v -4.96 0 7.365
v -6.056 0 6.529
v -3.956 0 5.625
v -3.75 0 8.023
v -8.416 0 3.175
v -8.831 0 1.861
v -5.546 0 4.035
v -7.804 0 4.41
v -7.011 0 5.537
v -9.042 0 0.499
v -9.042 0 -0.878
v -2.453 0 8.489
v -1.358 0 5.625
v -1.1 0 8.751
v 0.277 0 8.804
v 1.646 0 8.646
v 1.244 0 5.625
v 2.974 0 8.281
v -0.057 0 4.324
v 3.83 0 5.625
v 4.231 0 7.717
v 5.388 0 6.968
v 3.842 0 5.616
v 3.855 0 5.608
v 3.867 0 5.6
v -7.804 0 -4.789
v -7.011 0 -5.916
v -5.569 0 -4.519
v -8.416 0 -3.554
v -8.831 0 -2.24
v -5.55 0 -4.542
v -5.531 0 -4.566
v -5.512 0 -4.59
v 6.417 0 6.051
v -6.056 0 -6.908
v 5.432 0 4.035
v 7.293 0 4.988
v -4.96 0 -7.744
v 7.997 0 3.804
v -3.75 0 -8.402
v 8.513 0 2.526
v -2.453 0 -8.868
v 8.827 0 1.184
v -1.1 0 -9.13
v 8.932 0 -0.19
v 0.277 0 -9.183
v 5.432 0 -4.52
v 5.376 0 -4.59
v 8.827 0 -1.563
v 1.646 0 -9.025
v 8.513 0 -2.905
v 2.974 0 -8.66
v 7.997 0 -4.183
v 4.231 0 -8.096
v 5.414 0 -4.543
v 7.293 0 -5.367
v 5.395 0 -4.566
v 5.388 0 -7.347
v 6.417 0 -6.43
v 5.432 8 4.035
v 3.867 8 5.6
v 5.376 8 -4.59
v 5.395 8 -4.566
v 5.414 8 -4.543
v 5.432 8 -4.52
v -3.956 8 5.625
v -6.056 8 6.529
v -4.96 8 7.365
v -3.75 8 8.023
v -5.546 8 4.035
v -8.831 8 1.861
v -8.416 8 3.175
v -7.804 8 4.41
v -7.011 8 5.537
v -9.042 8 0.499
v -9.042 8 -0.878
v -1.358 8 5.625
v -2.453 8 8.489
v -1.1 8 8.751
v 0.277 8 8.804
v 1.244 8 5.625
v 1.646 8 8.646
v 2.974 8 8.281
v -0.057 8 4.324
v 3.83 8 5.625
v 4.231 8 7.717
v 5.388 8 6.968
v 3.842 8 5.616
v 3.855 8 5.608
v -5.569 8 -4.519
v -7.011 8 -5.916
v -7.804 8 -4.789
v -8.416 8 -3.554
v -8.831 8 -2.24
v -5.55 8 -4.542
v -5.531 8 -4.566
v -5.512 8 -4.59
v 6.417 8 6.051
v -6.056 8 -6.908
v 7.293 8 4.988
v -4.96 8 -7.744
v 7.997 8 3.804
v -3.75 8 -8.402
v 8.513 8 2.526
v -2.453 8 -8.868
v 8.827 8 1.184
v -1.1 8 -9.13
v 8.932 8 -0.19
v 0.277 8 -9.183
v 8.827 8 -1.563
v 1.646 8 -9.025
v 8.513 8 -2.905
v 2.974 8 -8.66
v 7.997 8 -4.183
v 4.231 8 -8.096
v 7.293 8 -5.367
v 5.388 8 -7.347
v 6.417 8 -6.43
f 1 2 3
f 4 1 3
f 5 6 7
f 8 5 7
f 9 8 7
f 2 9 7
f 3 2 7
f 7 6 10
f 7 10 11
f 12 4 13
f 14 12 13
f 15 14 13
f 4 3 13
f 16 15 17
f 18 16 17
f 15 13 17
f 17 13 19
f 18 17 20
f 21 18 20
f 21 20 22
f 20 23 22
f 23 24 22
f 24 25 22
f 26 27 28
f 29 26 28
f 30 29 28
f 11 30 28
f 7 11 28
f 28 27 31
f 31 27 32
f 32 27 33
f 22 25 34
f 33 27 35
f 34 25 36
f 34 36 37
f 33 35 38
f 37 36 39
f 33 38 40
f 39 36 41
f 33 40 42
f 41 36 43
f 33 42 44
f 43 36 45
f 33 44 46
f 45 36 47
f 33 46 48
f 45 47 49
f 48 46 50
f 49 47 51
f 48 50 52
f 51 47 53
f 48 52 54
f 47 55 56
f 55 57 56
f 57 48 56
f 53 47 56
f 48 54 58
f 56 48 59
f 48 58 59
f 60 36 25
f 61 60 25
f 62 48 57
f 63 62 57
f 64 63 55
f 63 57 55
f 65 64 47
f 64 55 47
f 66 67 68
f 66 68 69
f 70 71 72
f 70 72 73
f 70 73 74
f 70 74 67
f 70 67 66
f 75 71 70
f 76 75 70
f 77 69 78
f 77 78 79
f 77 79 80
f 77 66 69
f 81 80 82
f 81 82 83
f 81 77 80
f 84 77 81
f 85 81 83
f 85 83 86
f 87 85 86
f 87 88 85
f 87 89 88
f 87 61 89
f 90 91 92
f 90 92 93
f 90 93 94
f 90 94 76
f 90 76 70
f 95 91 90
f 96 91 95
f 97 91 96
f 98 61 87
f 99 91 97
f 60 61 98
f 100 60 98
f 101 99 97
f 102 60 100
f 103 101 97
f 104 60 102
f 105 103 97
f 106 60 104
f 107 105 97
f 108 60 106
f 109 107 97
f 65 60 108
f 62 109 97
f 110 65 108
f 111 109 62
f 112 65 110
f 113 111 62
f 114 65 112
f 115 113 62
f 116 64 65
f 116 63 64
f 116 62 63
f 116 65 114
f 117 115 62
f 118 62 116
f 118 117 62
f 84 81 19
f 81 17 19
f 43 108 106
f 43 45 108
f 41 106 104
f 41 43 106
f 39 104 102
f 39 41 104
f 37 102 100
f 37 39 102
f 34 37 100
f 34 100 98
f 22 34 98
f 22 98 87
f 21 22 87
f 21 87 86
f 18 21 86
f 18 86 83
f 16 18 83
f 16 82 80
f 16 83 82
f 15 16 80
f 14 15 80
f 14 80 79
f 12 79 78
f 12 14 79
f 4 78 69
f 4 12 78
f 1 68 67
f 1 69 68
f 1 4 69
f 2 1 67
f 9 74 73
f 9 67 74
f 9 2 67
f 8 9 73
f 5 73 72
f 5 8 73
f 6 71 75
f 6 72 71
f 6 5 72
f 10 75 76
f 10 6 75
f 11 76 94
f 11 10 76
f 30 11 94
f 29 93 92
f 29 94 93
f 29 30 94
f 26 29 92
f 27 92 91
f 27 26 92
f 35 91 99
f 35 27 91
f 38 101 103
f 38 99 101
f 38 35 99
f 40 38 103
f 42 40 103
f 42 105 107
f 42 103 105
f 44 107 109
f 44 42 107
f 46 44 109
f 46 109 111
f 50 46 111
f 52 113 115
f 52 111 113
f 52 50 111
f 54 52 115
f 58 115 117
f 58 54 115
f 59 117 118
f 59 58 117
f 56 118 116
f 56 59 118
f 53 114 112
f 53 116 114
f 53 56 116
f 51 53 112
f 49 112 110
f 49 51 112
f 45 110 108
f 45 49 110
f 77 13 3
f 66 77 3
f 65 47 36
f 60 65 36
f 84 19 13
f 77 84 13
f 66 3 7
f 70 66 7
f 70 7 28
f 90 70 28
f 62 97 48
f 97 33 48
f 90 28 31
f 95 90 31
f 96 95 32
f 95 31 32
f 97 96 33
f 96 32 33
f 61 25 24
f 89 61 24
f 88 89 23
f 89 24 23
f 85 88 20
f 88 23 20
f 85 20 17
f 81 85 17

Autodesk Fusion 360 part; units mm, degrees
sketch "Sketch1" plane through (0, 0, 0) normal (0, 1, 0) x (1, 0, 0)
  circle A0 centre (0, 0) radius 6.5
  line L0 (10.0631, -5.0894) -> (15.2631, -5.0894)
  line L1 (15.2631, -5.0894) -> (15.2631, 5.1106)
  line L2 (15.2631, 5.1106) -> (10.0631, 5.1106)
  line L3 (10.0631, 5.1106) -> (10.0631, -5.0894)
  dimension "d1" = 13
  dimension "d2" = 5.2
  dimension "d3" = 10.2
sketch "Sketch2" plane through (0, 0, 0) normal (0, 1, 0) x (1, 0, 0)
sketch "Sketch3" plane through (0, 0, 0) normal (0, 1, 0) x (1, 0, 0)
  line L0 (-5.268, 4.2895) -> (-0.068, 4.2895)
  line L1 (-0.068, 4.2895) -> (-0.068, -3.9105)
  line L2 (-0.068, -3.9105) -> (-1.4822, -5.3247)
  line L3 (-0.068, -3.9105) -> (1.932, -3.9105) construction
  line L4 (-1.4822, -5.3247) -> (-3.8322, -5.3247)
  line L5 (-3.8322, -5.3247) -> (-5.2464, -3.9105)
  line L6 (-3.8322, -5.3247) -> (-1.9822, -5.3247) construction
  line L7 (-5.2464, -3.9105) -> (-5.268, 4.2895)
  line L8 (1.3678, -5.3247) -> (-0.0464, -3.9105)
  line L9 (5.132, 4.2895) -> (5.132, -3.9105)
  line L10 (-0.0464, -3.9105) -> (-0.068, 4.2895)
  line L11 (-0.068, 4.2895) -> (5.132, 4.2895)
  line L12 (5.132, -3.9105) -> (3.7178, -5.3247)
  line L13 (3.7178, -5.3247) -> (1.3678, -5.3247)
  line L14 (1.3678, -5.3247) -> (3.2178, -5.3247) construction
  line L15 (-5.2464, -3.9105) -> (5.132, 4.2895)
  line L16 (-5.268, 4.2895) -> (5.132, -3.9105)
  circle A0 centre (-0.068, 0.1895) radius 7
  line L17 (-5.268, 4.2895) -> (5.132, 4.2895)
  line L18 (-0.0464, -3.9105) -> (-0.068, -3.9105)
  circle A1 centre (-0.068, 0.1895) radius 9
  line L19 (-0.0572, -4.324) -> (-1.358, -5.6247)
  line L20 (-1.358, -5.6247) -> (-3.9565, -5.6247)
  line L21 (-3.9565, -5.6247) -> (-5.5461, -4.0351)
  line L22 (-5.5461, -4.0351) -> (-5.5688, 4.5895)
  line L23 (-5.5688, 4.5895) -> (-0.068, 4.5895)
  line L24 (-0.068, 4.5895) -> (5.432, 4.5895)
  line L25 (5.432, 4.5895) -> (5.432, -4.0348)
  line L26 (5.432, -4.0348) -> (3.842, -5.6247)
  line L27 (3.842, -5.6247) -> (1.2435, -5.6247)
  line L28 (1.2435, -5.6247) -> (-0.0572, -4.324)
  dimension "d4" = 5.2
  dimension "d5" = 8.2
  dimension "d6" = 135
  dimension "d7" = 2
  dimension "d8" = 2.35
  dimension "d9" = 135
  dimension "d10" = 2
  dimension "d11" = 5.2
  dimension "d12" = 8.2
  dimension "d13" = 2
  dimension "d14" = 2.35
  dimension "d15" = 135
  dimension "d16" = 2
  dimension "d17" = 14
  dimension "d20" = 18
  dimension "d27" = -0.3
extrude "Extrude2" add sketch "Sketch3" along normal blind 8 contours A0 L25 L26 | A0 L24 L25 | A0 L26 L27 | A0 L23 L24 | A0 L19 L20 L21 L22 L27 L28 | A0 L22 L23 | A1
